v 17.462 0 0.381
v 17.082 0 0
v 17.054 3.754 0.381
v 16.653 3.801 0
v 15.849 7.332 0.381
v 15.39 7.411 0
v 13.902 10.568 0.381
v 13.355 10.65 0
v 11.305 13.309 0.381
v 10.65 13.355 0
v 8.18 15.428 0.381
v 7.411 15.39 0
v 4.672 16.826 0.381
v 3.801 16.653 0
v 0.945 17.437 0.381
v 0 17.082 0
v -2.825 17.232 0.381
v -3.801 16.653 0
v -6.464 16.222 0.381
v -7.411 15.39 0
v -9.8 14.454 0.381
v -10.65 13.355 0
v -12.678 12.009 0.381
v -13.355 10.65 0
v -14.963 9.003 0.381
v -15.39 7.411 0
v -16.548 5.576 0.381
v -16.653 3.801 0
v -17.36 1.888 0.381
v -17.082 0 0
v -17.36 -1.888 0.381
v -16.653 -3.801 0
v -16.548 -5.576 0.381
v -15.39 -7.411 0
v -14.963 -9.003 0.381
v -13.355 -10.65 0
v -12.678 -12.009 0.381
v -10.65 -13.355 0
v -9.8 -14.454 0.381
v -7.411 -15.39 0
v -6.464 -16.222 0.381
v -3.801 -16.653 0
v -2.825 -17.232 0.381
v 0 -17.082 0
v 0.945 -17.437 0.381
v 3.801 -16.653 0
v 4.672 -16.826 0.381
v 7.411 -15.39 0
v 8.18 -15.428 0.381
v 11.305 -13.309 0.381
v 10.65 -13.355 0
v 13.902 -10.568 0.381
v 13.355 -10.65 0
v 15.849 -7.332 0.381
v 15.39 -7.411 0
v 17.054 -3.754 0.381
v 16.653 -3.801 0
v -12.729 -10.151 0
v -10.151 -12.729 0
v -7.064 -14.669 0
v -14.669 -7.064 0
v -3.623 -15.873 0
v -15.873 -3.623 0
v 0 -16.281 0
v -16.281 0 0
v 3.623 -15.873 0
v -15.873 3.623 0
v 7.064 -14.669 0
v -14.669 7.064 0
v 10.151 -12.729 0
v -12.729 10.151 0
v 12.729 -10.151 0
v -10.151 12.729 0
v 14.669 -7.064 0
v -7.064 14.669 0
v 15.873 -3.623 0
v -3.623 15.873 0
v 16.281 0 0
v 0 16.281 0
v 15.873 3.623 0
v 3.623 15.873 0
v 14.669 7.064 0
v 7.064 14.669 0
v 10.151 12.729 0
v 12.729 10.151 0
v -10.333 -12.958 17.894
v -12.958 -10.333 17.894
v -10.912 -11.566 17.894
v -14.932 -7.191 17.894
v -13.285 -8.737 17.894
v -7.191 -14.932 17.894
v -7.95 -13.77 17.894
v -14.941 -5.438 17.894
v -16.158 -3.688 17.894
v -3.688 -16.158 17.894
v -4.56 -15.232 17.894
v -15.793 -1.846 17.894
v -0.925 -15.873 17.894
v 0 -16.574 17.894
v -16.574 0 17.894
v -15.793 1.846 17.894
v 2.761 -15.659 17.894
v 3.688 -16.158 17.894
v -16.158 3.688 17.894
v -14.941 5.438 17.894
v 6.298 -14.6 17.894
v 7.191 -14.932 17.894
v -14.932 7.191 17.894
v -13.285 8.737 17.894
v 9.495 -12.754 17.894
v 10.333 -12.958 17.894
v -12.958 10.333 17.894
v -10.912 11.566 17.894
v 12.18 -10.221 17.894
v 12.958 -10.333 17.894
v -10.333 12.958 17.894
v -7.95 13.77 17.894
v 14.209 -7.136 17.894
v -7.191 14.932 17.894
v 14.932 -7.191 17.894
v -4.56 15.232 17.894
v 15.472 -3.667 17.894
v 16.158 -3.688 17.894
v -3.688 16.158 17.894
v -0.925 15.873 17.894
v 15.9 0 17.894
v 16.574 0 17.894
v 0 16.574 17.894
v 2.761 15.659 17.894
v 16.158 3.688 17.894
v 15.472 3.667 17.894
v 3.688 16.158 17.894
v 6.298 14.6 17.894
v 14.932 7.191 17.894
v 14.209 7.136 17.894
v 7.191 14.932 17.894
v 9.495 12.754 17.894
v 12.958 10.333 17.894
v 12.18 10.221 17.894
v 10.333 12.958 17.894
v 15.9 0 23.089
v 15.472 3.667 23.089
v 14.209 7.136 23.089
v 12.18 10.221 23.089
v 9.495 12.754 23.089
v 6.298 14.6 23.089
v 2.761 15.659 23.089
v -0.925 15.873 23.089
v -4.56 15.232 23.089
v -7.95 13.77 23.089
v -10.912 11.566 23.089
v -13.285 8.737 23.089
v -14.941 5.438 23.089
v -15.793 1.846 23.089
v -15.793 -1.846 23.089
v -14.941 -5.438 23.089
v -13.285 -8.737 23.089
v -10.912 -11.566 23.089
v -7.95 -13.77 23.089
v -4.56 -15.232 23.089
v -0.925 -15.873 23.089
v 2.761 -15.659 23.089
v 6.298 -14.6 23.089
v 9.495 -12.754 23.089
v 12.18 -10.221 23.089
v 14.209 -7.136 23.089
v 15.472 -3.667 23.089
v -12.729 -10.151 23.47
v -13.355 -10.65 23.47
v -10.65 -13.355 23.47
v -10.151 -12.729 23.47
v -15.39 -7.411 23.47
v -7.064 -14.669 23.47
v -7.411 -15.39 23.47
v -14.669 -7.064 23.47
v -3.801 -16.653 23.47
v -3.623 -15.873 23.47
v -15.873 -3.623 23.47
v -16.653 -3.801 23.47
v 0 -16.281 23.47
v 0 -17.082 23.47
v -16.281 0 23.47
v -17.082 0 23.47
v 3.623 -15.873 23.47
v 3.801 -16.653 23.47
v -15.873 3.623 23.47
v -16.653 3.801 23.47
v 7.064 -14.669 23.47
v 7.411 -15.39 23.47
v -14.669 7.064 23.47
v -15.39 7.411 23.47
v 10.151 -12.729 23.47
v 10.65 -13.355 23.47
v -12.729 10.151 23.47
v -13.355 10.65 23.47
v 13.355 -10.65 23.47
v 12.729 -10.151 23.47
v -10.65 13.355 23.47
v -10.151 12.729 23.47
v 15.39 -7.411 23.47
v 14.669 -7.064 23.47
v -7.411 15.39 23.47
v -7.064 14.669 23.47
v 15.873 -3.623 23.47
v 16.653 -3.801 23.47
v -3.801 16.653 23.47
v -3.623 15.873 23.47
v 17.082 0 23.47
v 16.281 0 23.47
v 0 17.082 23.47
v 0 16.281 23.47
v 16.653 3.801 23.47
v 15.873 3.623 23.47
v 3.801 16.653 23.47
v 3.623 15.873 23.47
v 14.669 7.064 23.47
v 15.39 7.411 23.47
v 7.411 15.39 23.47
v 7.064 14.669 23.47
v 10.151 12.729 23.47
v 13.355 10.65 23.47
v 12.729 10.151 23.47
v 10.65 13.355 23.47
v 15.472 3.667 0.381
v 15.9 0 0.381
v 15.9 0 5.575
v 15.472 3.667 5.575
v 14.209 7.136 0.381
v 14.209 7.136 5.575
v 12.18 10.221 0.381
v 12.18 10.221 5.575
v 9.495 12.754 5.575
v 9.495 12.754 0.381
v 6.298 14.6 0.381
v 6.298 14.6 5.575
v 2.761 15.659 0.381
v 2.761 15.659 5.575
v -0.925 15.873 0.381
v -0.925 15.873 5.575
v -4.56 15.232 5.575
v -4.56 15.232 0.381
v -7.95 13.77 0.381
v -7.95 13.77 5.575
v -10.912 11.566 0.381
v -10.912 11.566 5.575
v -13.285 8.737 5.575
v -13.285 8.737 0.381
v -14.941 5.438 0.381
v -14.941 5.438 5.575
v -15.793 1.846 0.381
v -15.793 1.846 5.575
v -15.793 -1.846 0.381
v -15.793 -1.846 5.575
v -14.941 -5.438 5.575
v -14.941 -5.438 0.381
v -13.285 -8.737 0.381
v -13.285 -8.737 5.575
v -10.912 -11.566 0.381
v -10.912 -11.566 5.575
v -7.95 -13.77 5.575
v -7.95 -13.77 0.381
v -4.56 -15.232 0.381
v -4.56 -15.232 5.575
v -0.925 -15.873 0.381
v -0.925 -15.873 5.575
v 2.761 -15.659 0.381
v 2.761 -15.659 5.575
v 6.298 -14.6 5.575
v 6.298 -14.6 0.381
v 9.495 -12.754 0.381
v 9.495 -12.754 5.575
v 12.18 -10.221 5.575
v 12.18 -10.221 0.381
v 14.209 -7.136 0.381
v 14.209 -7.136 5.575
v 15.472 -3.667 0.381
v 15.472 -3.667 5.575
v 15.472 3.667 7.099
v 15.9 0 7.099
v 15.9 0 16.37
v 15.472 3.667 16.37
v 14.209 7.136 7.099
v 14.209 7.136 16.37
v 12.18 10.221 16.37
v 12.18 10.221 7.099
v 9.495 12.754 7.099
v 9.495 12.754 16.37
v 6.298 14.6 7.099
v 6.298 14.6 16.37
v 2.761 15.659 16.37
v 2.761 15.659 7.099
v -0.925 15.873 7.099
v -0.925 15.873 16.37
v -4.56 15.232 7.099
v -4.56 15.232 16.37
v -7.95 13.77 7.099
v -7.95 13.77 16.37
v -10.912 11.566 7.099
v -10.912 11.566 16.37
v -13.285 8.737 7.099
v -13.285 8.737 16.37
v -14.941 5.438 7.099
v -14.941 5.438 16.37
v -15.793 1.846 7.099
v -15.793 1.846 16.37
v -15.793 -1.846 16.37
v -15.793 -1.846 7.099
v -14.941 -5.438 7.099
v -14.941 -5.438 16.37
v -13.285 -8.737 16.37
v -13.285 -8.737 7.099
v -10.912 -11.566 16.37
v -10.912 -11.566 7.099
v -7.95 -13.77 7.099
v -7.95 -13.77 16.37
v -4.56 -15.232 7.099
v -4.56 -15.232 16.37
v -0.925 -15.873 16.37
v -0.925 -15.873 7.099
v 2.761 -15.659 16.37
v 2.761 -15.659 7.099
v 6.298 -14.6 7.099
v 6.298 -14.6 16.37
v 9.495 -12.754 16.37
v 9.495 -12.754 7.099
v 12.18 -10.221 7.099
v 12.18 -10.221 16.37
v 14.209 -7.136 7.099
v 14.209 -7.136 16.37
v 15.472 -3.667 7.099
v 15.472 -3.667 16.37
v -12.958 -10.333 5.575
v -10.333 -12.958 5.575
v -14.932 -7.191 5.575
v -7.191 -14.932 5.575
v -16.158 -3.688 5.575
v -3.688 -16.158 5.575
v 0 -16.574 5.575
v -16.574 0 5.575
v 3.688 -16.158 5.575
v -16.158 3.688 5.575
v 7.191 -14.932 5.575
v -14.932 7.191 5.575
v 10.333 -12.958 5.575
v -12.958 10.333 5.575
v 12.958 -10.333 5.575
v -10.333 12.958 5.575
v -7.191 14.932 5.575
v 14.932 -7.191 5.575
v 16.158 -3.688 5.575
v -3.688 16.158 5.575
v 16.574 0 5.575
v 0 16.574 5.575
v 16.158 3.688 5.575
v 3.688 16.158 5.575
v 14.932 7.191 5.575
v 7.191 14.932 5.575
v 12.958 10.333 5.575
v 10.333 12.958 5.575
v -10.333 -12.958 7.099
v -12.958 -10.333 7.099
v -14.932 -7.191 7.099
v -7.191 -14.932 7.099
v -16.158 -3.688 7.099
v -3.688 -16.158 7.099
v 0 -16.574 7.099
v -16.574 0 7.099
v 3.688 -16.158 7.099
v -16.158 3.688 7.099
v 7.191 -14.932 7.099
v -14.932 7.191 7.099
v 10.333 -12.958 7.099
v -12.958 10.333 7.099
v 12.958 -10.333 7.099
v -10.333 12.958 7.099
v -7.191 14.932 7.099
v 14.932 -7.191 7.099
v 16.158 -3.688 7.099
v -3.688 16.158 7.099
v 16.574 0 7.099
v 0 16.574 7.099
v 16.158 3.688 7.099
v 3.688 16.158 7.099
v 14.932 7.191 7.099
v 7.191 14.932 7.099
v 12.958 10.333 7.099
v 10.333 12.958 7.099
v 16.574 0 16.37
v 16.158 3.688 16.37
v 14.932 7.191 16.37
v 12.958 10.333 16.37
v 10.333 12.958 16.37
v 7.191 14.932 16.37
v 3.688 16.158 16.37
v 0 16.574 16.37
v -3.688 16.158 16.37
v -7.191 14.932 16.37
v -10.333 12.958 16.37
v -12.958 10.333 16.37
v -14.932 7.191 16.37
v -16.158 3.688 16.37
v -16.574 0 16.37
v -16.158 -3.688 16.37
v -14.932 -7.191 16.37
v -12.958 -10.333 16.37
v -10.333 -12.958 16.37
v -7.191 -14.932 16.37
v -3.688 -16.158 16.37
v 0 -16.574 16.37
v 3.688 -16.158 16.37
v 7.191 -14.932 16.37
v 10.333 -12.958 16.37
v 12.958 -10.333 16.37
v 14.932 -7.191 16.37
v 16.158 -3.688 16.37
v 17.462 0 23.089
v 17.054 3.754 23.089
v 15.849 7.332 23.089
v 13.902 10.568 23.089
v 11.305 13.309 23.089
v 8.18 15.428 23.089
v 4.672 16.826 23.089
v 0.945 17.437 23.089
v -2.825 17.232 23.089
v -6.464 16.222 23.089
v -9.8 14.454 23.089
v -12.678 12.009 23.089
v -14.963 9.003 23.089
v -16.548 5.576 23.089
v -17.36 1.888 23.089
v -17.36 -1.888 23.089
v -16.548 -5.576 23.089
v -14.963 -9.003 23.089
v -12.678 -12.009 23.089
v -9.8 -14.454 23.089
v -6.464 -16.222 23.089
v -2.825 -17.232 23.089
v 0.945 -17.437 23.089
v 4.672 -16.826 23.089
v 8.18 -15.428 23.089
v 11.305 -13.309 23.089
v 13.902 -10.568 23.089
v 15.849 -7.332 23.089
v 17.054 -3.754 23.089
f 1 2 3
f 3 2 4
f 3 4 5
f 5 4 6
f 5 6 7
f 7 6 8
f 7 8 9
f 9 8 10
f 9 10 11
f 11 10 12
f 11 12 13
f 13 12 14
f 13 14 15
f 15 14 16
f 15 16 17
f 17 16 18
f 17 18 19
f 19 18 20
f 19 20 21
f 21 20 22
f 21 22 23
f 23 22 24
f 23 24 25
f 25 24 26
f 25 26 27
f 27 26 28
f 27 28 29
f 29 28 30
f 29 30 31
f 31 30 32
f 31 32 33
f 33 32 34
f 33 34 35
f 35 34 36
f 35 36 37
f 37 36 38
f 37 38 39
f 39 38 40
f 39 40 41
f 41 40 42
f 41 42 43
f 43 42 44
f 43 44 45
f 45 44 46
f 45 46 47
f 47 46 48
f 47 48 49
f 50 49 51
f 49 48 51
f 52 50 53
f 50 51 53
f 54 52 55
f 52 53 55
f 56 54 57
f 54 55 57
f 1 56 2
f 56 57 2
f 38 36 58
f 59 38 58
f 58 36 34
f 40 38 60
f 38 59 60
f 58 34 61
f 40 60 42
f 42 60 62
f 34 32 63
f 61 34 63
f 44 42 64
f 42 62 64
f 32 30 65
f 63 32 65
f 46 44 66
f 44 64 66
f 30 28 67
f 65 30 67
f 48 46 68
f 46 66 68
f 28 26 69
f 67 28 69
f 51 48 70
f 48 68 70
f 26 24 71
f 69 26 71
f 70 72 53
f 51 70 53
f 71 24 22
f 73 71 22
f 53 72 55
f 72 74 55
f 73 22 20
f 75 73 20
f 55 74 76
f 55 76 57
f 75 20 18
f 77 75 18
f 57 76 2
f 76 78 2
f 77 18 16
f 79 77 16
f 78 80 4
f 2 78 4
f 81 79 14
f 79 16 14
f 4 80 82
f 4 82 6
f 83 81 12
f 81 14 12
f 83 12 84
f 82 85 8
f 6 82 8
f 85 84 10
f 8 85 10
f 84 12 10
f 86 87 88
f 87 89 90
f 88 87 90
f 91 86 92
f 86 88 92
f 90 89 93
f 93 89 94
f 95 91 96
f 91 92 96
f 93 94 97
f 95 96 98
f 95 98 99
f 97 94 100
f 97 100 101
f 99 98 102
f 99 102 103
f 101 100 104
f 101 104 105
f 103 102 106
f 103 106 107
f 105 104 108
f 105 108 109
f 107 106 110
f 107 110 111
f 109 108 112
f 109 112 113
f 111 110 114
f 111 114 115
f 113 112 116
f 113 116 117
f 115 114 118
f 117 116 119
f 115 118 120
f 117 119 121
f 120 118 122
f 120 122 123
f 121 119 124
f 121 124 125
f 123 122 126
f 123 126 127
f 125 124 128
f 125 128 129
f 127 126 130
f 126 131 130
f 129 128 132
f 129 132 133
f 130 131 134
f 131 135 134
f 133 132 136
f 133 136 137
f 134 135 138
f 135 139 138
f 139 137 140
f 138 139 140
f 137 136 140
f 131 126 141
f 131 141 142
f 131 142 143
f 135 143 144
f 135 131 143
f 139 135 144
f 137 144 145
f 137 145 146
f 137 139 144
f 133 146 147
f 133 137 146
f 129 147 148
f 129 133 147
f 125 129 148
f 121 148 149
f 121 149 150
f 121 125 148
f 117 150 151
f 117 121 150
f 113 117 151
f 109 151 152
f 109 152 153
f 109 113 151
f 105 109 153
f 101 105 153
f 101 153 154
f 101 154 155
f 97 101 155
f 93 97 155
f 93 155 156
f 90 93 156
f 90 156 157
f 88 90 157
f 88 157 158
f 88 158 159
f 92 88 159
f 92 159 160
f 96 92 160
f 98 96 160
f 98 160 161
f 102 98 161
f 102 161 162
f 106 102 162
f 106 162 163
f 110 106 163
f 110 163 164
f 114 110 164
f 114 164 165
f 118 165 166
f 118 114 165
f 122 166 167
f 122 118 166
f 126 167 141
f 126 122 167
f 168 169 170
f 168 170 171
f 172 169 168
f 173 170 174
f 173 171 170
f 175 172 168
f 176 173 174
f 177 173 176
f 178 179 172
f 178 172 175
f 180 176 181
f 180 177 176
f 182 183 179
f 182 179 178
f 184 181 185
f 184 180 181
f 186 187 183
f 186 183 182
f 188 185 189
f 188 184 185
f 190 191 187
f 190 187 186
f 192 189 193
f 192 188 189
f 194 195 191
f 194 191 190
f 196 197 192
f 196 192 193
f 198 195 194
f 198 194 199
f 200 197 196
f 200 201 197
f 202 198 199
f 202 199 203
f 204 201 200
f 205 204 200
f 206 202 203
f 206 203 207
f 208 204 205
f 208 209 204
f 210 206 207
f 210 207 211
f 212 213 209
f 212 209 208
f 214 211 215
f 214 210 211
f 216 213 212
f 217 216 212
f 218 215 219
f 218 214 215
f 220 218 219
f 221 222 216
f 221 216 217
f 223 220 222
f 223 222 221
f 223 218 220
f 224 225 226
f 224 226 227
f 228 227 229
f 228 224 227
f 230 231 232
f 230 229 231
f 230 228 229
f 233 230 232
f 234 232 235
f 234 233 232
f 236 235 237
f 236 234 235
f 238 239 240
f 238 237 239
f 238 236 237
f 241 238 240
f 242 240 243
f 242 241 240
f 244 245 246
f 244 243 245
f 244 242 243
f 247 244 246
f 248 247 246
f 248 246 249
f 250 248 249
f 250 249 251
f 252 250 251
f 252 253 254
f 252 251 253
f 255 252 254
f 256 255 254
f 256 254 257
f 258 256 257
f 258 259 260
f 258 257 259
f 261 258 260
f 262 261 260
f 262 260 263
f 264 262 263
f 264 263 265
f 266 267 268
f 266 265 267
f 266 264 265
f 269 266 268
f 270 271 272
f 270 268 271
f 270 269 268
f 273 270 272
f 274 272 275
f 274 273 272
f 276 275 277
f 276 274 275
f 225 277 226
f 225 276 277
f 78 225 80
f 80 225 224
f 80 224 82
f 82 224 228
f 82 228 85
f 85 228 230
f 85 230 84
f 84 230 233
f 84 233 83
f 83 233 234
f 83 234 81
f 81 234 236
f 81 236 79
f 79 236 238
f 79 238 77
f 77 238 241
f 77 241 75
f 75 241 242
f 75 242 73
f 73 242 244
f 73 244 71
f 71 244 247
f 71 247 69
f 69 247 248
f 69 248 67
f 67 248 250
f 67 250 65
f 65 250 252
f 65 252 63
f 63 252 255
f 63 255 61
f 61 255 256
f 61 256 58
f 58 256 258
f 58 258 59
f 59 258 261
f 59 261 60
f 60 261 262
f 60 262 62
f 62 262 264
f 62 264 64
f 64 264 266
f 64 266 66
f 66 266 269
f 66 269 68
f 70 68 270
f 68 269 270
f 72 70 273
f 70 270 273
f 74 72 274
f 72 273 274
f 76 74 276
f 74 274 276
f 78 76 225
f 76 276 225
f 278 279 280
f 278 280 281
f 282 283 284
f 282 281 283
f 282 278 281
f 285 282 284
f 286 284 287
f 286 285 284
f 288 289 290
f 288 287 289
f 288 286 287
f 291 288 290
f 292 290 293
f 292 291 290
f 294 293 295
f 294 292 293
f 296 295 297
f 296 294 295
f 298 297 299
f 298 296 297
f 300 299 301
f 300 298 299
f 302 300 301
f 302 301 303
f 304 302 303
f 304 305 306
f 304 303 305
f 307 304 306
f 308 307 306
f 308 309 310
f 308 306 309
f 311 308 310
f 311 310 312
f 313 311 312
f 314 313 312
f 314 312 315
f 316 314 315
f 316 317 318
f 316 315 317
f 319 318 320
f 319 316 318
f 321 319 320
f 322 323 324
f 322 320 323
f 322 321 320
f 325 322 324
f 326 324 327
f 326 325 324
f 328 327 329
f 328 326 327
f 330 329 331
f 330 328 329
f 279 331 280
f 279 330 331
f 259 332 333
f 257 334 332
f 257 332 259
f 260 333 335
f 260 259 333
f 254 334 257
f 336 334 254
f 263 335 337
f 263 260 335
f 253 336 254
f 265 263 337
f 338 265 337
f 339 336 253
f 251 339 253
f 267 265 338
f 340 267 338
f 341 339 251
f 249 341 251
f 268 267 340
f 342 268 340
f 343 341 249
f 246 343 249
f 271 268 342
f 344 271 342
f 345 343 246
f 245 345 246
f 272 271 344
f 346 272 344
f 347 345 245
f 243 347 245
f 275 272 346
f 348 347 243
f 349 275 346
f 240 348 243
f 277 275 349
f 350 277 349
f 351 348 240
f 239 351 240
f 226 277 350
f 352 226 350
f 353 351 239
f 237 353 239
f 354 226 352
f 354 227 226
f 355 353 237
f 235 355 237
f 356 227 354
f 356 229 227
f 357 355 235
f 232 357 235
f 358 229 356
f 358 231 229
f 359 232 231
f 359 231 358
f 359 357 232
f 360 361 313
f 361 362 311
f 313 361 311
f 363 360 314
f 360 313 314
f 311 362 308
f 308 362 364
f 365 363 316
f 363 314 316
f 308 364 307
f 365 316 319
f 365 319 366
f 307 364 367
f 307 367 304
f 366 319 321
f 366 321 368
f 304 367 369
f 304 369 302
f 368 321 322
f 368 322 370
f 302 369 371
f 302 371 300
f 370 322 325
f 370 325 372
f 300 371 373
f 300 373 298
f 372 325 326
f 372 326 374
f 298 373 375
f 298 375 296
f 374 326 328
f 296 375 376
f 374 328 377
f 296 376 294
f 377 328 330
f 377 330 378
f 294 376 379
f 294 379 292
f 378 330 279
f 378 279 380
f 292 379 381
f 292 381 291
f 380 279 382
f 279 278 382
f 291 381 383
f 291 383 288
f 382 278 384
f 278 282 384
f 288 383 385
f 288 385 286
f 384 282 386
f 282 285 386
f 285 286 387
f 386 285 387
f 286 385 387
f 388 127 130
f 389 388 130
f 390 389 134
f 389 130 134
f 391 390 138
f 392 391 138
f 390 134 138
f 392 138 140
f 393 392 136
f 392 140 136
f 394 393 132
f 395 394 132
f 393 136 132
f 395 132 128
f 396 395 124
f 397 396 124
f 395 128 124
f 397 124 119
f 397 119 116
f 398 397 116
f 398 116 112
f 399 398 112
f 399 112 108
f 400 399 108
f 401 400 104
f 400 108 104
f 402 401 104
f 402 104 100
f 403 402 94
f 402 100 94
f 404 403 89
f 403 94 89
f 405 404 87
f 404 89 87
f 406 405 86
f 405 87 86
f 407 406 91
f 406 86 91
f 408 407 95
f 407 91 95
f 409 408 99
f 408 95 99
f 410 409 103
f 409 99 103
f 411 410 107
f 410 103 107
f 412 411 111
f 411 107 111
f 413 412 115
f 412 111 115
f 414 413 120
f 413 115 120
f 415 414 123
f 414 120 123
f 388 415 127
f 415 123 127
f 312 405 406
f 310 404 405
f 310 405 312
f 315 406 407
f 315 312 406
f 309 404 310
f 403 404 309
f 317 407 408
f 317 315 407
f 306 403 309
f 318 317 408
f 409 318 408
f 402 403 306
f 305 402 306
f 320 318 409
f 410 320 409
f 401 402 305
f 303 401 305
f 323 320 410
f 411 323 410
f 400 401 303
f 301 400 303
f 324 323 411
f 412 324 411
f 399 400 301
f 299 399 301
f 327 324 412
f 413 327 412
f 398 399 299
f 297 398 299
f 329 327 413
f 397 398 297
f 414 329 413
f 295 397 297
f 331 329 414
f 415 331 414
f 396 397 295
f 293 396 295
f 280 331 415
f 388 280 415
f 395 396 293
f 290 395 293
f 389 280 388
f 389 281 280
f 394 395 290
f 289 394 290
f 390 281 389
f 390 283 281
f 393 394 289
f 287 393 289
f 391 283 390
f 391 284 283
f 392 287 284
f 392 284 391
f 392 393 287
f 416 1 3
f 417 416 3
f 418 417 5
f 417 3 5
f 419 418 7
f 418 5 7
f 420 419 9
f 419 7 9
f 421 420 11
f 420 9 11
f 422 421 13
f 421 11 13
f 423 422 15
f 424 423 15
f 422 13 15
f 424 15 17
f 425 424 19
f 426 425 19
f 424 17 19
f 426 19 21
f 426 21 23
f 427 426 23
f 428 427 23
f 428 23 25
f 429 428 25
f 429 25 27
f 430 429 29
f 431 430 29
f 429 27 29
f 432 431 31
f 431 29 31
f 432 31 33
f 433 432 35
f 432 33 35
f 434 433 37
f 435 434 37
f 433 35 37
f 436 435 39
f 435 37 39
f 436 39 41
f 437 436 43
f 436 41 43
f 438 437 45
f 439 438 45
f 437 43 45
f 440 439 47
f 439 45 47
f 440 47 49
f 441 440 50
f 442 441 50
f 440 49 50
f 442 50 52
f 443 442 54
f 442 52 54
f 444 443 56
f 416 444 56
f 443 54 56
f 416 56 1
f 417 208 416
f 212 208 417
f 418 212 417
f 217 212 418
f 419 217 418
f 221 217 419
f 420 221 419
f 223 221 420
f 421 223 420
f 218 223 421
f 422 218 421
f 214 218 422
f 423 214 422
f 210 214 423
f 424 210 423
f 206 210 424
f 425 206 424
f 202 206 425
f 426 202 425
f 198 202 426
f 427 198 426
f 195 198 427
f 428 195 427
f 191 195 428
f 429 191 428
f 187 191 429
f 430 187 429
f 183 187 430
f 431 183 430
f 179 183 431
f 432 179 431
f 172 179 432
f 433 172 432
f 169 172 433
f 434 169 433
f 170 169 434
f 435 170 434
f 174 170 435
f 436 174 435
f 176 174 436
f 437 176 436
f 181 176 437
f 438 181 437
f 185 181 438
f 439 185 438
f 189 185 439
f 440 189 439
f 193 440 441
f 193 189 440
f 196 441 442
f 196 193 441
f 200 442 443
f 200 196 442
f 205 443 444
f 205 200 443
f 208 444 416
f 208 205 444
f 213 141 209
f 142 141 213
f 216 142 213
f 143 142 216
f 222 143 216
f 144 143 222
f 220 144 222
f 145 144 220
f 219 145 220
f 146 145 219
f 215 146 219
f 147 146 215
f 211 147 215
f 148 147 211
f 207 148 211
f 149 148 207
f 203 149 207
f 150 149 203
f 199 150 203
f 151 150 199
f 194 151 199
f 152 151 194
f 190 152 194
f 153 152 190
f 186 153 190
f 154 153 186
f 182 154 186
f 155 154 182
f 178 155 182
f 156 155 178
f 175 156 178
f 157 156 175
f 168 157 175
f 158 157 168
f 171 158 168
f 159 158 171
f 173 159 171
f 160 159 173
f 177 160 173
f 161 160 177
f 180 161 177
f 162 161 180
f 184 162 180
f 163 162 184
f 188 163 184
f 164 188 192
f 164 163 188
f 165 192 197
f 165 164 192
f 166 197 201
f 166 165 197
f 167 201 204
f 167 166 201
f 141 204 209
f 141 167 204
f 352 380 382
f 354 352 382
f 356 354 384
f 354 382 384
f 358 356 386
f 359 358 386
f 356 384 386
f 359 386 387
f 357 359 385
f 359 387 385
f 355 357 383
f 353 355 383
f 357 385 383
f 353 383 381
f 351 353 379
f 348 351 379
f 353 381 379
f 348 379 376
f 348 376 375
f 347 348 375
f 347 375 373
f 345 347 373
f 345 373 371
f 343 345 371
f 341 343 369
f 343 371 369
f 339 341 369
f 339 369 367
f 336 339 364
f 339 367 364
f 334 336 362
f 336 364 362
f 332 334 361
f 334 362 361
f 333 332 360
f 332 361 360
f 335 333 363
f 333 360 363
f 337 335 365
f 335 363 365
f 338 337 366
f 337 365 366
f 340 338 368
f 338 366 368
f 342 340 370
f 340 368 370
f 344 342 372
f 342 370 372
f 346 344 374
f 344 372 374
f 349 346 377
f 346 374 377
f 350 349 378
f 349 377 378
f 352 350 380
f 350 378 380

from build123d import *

# Parameters (mm, degrees)
SKETCH1_R          = 17.4625
SKETCH1_R_2        = 15.9004
BASE_EXTRUDE_DEPTH = 23.4696
SKETCH2_R          = 16.5735
CUT_EXTRUDE1_DEPTH = 1.524
CUT_EXTRUDE2_START = 1.524
SKETCH3_R          = 16.5735
CUT_EXTRUDE2_DEPTH = 1.524
CHAMFER1_SIZE      = 0.381


with BuildPart() as part:
    # Sketch1 → Base-Extrude (new body)
    with BuildSketch(Plane.XY):
        Circle(SKETCH1_R)
        Circle(SKETCH1_R_2, mode=Mode.SUBTRACT)
    extrude(amount=BASE_EXTRUDE_DEPTH)

    # Sketch2 → Cut-Extrude1 (cut)
    with BuildSketch(Plane.XY.offset(7.0993)):
        Circle(SKETCH2_R)
    extrude(amount=-CUT_EXTRUDE1_DEPTH, mode=Mode.SUBTRACT)

    # Sketch3 → Cut-Extrude2 (cut)
    with BuildSketch(Plane.XY.offset(16.3703).offset(CUT_EXTRUDE2_START)):
        Circle(SKETCH3_R)
    extrude(amount=-CUT_EXTRUDE2_DEPTH, mode=Mode.SUBTRACT)

    # Chamfer1
    chamfer1_edges = [part.edges().sort_by_distance(p)[0] for p in [
        (-17.4625, 0, 0),
        (-17.4625, 0, 23.4696),
        (-15.9004, 0, 0),
        (-15.9004, 0, 23.4696),
    ]]
    chamfer(chamfer1_edges, length=CHAMFER1_SIZE)


solid = part.part
